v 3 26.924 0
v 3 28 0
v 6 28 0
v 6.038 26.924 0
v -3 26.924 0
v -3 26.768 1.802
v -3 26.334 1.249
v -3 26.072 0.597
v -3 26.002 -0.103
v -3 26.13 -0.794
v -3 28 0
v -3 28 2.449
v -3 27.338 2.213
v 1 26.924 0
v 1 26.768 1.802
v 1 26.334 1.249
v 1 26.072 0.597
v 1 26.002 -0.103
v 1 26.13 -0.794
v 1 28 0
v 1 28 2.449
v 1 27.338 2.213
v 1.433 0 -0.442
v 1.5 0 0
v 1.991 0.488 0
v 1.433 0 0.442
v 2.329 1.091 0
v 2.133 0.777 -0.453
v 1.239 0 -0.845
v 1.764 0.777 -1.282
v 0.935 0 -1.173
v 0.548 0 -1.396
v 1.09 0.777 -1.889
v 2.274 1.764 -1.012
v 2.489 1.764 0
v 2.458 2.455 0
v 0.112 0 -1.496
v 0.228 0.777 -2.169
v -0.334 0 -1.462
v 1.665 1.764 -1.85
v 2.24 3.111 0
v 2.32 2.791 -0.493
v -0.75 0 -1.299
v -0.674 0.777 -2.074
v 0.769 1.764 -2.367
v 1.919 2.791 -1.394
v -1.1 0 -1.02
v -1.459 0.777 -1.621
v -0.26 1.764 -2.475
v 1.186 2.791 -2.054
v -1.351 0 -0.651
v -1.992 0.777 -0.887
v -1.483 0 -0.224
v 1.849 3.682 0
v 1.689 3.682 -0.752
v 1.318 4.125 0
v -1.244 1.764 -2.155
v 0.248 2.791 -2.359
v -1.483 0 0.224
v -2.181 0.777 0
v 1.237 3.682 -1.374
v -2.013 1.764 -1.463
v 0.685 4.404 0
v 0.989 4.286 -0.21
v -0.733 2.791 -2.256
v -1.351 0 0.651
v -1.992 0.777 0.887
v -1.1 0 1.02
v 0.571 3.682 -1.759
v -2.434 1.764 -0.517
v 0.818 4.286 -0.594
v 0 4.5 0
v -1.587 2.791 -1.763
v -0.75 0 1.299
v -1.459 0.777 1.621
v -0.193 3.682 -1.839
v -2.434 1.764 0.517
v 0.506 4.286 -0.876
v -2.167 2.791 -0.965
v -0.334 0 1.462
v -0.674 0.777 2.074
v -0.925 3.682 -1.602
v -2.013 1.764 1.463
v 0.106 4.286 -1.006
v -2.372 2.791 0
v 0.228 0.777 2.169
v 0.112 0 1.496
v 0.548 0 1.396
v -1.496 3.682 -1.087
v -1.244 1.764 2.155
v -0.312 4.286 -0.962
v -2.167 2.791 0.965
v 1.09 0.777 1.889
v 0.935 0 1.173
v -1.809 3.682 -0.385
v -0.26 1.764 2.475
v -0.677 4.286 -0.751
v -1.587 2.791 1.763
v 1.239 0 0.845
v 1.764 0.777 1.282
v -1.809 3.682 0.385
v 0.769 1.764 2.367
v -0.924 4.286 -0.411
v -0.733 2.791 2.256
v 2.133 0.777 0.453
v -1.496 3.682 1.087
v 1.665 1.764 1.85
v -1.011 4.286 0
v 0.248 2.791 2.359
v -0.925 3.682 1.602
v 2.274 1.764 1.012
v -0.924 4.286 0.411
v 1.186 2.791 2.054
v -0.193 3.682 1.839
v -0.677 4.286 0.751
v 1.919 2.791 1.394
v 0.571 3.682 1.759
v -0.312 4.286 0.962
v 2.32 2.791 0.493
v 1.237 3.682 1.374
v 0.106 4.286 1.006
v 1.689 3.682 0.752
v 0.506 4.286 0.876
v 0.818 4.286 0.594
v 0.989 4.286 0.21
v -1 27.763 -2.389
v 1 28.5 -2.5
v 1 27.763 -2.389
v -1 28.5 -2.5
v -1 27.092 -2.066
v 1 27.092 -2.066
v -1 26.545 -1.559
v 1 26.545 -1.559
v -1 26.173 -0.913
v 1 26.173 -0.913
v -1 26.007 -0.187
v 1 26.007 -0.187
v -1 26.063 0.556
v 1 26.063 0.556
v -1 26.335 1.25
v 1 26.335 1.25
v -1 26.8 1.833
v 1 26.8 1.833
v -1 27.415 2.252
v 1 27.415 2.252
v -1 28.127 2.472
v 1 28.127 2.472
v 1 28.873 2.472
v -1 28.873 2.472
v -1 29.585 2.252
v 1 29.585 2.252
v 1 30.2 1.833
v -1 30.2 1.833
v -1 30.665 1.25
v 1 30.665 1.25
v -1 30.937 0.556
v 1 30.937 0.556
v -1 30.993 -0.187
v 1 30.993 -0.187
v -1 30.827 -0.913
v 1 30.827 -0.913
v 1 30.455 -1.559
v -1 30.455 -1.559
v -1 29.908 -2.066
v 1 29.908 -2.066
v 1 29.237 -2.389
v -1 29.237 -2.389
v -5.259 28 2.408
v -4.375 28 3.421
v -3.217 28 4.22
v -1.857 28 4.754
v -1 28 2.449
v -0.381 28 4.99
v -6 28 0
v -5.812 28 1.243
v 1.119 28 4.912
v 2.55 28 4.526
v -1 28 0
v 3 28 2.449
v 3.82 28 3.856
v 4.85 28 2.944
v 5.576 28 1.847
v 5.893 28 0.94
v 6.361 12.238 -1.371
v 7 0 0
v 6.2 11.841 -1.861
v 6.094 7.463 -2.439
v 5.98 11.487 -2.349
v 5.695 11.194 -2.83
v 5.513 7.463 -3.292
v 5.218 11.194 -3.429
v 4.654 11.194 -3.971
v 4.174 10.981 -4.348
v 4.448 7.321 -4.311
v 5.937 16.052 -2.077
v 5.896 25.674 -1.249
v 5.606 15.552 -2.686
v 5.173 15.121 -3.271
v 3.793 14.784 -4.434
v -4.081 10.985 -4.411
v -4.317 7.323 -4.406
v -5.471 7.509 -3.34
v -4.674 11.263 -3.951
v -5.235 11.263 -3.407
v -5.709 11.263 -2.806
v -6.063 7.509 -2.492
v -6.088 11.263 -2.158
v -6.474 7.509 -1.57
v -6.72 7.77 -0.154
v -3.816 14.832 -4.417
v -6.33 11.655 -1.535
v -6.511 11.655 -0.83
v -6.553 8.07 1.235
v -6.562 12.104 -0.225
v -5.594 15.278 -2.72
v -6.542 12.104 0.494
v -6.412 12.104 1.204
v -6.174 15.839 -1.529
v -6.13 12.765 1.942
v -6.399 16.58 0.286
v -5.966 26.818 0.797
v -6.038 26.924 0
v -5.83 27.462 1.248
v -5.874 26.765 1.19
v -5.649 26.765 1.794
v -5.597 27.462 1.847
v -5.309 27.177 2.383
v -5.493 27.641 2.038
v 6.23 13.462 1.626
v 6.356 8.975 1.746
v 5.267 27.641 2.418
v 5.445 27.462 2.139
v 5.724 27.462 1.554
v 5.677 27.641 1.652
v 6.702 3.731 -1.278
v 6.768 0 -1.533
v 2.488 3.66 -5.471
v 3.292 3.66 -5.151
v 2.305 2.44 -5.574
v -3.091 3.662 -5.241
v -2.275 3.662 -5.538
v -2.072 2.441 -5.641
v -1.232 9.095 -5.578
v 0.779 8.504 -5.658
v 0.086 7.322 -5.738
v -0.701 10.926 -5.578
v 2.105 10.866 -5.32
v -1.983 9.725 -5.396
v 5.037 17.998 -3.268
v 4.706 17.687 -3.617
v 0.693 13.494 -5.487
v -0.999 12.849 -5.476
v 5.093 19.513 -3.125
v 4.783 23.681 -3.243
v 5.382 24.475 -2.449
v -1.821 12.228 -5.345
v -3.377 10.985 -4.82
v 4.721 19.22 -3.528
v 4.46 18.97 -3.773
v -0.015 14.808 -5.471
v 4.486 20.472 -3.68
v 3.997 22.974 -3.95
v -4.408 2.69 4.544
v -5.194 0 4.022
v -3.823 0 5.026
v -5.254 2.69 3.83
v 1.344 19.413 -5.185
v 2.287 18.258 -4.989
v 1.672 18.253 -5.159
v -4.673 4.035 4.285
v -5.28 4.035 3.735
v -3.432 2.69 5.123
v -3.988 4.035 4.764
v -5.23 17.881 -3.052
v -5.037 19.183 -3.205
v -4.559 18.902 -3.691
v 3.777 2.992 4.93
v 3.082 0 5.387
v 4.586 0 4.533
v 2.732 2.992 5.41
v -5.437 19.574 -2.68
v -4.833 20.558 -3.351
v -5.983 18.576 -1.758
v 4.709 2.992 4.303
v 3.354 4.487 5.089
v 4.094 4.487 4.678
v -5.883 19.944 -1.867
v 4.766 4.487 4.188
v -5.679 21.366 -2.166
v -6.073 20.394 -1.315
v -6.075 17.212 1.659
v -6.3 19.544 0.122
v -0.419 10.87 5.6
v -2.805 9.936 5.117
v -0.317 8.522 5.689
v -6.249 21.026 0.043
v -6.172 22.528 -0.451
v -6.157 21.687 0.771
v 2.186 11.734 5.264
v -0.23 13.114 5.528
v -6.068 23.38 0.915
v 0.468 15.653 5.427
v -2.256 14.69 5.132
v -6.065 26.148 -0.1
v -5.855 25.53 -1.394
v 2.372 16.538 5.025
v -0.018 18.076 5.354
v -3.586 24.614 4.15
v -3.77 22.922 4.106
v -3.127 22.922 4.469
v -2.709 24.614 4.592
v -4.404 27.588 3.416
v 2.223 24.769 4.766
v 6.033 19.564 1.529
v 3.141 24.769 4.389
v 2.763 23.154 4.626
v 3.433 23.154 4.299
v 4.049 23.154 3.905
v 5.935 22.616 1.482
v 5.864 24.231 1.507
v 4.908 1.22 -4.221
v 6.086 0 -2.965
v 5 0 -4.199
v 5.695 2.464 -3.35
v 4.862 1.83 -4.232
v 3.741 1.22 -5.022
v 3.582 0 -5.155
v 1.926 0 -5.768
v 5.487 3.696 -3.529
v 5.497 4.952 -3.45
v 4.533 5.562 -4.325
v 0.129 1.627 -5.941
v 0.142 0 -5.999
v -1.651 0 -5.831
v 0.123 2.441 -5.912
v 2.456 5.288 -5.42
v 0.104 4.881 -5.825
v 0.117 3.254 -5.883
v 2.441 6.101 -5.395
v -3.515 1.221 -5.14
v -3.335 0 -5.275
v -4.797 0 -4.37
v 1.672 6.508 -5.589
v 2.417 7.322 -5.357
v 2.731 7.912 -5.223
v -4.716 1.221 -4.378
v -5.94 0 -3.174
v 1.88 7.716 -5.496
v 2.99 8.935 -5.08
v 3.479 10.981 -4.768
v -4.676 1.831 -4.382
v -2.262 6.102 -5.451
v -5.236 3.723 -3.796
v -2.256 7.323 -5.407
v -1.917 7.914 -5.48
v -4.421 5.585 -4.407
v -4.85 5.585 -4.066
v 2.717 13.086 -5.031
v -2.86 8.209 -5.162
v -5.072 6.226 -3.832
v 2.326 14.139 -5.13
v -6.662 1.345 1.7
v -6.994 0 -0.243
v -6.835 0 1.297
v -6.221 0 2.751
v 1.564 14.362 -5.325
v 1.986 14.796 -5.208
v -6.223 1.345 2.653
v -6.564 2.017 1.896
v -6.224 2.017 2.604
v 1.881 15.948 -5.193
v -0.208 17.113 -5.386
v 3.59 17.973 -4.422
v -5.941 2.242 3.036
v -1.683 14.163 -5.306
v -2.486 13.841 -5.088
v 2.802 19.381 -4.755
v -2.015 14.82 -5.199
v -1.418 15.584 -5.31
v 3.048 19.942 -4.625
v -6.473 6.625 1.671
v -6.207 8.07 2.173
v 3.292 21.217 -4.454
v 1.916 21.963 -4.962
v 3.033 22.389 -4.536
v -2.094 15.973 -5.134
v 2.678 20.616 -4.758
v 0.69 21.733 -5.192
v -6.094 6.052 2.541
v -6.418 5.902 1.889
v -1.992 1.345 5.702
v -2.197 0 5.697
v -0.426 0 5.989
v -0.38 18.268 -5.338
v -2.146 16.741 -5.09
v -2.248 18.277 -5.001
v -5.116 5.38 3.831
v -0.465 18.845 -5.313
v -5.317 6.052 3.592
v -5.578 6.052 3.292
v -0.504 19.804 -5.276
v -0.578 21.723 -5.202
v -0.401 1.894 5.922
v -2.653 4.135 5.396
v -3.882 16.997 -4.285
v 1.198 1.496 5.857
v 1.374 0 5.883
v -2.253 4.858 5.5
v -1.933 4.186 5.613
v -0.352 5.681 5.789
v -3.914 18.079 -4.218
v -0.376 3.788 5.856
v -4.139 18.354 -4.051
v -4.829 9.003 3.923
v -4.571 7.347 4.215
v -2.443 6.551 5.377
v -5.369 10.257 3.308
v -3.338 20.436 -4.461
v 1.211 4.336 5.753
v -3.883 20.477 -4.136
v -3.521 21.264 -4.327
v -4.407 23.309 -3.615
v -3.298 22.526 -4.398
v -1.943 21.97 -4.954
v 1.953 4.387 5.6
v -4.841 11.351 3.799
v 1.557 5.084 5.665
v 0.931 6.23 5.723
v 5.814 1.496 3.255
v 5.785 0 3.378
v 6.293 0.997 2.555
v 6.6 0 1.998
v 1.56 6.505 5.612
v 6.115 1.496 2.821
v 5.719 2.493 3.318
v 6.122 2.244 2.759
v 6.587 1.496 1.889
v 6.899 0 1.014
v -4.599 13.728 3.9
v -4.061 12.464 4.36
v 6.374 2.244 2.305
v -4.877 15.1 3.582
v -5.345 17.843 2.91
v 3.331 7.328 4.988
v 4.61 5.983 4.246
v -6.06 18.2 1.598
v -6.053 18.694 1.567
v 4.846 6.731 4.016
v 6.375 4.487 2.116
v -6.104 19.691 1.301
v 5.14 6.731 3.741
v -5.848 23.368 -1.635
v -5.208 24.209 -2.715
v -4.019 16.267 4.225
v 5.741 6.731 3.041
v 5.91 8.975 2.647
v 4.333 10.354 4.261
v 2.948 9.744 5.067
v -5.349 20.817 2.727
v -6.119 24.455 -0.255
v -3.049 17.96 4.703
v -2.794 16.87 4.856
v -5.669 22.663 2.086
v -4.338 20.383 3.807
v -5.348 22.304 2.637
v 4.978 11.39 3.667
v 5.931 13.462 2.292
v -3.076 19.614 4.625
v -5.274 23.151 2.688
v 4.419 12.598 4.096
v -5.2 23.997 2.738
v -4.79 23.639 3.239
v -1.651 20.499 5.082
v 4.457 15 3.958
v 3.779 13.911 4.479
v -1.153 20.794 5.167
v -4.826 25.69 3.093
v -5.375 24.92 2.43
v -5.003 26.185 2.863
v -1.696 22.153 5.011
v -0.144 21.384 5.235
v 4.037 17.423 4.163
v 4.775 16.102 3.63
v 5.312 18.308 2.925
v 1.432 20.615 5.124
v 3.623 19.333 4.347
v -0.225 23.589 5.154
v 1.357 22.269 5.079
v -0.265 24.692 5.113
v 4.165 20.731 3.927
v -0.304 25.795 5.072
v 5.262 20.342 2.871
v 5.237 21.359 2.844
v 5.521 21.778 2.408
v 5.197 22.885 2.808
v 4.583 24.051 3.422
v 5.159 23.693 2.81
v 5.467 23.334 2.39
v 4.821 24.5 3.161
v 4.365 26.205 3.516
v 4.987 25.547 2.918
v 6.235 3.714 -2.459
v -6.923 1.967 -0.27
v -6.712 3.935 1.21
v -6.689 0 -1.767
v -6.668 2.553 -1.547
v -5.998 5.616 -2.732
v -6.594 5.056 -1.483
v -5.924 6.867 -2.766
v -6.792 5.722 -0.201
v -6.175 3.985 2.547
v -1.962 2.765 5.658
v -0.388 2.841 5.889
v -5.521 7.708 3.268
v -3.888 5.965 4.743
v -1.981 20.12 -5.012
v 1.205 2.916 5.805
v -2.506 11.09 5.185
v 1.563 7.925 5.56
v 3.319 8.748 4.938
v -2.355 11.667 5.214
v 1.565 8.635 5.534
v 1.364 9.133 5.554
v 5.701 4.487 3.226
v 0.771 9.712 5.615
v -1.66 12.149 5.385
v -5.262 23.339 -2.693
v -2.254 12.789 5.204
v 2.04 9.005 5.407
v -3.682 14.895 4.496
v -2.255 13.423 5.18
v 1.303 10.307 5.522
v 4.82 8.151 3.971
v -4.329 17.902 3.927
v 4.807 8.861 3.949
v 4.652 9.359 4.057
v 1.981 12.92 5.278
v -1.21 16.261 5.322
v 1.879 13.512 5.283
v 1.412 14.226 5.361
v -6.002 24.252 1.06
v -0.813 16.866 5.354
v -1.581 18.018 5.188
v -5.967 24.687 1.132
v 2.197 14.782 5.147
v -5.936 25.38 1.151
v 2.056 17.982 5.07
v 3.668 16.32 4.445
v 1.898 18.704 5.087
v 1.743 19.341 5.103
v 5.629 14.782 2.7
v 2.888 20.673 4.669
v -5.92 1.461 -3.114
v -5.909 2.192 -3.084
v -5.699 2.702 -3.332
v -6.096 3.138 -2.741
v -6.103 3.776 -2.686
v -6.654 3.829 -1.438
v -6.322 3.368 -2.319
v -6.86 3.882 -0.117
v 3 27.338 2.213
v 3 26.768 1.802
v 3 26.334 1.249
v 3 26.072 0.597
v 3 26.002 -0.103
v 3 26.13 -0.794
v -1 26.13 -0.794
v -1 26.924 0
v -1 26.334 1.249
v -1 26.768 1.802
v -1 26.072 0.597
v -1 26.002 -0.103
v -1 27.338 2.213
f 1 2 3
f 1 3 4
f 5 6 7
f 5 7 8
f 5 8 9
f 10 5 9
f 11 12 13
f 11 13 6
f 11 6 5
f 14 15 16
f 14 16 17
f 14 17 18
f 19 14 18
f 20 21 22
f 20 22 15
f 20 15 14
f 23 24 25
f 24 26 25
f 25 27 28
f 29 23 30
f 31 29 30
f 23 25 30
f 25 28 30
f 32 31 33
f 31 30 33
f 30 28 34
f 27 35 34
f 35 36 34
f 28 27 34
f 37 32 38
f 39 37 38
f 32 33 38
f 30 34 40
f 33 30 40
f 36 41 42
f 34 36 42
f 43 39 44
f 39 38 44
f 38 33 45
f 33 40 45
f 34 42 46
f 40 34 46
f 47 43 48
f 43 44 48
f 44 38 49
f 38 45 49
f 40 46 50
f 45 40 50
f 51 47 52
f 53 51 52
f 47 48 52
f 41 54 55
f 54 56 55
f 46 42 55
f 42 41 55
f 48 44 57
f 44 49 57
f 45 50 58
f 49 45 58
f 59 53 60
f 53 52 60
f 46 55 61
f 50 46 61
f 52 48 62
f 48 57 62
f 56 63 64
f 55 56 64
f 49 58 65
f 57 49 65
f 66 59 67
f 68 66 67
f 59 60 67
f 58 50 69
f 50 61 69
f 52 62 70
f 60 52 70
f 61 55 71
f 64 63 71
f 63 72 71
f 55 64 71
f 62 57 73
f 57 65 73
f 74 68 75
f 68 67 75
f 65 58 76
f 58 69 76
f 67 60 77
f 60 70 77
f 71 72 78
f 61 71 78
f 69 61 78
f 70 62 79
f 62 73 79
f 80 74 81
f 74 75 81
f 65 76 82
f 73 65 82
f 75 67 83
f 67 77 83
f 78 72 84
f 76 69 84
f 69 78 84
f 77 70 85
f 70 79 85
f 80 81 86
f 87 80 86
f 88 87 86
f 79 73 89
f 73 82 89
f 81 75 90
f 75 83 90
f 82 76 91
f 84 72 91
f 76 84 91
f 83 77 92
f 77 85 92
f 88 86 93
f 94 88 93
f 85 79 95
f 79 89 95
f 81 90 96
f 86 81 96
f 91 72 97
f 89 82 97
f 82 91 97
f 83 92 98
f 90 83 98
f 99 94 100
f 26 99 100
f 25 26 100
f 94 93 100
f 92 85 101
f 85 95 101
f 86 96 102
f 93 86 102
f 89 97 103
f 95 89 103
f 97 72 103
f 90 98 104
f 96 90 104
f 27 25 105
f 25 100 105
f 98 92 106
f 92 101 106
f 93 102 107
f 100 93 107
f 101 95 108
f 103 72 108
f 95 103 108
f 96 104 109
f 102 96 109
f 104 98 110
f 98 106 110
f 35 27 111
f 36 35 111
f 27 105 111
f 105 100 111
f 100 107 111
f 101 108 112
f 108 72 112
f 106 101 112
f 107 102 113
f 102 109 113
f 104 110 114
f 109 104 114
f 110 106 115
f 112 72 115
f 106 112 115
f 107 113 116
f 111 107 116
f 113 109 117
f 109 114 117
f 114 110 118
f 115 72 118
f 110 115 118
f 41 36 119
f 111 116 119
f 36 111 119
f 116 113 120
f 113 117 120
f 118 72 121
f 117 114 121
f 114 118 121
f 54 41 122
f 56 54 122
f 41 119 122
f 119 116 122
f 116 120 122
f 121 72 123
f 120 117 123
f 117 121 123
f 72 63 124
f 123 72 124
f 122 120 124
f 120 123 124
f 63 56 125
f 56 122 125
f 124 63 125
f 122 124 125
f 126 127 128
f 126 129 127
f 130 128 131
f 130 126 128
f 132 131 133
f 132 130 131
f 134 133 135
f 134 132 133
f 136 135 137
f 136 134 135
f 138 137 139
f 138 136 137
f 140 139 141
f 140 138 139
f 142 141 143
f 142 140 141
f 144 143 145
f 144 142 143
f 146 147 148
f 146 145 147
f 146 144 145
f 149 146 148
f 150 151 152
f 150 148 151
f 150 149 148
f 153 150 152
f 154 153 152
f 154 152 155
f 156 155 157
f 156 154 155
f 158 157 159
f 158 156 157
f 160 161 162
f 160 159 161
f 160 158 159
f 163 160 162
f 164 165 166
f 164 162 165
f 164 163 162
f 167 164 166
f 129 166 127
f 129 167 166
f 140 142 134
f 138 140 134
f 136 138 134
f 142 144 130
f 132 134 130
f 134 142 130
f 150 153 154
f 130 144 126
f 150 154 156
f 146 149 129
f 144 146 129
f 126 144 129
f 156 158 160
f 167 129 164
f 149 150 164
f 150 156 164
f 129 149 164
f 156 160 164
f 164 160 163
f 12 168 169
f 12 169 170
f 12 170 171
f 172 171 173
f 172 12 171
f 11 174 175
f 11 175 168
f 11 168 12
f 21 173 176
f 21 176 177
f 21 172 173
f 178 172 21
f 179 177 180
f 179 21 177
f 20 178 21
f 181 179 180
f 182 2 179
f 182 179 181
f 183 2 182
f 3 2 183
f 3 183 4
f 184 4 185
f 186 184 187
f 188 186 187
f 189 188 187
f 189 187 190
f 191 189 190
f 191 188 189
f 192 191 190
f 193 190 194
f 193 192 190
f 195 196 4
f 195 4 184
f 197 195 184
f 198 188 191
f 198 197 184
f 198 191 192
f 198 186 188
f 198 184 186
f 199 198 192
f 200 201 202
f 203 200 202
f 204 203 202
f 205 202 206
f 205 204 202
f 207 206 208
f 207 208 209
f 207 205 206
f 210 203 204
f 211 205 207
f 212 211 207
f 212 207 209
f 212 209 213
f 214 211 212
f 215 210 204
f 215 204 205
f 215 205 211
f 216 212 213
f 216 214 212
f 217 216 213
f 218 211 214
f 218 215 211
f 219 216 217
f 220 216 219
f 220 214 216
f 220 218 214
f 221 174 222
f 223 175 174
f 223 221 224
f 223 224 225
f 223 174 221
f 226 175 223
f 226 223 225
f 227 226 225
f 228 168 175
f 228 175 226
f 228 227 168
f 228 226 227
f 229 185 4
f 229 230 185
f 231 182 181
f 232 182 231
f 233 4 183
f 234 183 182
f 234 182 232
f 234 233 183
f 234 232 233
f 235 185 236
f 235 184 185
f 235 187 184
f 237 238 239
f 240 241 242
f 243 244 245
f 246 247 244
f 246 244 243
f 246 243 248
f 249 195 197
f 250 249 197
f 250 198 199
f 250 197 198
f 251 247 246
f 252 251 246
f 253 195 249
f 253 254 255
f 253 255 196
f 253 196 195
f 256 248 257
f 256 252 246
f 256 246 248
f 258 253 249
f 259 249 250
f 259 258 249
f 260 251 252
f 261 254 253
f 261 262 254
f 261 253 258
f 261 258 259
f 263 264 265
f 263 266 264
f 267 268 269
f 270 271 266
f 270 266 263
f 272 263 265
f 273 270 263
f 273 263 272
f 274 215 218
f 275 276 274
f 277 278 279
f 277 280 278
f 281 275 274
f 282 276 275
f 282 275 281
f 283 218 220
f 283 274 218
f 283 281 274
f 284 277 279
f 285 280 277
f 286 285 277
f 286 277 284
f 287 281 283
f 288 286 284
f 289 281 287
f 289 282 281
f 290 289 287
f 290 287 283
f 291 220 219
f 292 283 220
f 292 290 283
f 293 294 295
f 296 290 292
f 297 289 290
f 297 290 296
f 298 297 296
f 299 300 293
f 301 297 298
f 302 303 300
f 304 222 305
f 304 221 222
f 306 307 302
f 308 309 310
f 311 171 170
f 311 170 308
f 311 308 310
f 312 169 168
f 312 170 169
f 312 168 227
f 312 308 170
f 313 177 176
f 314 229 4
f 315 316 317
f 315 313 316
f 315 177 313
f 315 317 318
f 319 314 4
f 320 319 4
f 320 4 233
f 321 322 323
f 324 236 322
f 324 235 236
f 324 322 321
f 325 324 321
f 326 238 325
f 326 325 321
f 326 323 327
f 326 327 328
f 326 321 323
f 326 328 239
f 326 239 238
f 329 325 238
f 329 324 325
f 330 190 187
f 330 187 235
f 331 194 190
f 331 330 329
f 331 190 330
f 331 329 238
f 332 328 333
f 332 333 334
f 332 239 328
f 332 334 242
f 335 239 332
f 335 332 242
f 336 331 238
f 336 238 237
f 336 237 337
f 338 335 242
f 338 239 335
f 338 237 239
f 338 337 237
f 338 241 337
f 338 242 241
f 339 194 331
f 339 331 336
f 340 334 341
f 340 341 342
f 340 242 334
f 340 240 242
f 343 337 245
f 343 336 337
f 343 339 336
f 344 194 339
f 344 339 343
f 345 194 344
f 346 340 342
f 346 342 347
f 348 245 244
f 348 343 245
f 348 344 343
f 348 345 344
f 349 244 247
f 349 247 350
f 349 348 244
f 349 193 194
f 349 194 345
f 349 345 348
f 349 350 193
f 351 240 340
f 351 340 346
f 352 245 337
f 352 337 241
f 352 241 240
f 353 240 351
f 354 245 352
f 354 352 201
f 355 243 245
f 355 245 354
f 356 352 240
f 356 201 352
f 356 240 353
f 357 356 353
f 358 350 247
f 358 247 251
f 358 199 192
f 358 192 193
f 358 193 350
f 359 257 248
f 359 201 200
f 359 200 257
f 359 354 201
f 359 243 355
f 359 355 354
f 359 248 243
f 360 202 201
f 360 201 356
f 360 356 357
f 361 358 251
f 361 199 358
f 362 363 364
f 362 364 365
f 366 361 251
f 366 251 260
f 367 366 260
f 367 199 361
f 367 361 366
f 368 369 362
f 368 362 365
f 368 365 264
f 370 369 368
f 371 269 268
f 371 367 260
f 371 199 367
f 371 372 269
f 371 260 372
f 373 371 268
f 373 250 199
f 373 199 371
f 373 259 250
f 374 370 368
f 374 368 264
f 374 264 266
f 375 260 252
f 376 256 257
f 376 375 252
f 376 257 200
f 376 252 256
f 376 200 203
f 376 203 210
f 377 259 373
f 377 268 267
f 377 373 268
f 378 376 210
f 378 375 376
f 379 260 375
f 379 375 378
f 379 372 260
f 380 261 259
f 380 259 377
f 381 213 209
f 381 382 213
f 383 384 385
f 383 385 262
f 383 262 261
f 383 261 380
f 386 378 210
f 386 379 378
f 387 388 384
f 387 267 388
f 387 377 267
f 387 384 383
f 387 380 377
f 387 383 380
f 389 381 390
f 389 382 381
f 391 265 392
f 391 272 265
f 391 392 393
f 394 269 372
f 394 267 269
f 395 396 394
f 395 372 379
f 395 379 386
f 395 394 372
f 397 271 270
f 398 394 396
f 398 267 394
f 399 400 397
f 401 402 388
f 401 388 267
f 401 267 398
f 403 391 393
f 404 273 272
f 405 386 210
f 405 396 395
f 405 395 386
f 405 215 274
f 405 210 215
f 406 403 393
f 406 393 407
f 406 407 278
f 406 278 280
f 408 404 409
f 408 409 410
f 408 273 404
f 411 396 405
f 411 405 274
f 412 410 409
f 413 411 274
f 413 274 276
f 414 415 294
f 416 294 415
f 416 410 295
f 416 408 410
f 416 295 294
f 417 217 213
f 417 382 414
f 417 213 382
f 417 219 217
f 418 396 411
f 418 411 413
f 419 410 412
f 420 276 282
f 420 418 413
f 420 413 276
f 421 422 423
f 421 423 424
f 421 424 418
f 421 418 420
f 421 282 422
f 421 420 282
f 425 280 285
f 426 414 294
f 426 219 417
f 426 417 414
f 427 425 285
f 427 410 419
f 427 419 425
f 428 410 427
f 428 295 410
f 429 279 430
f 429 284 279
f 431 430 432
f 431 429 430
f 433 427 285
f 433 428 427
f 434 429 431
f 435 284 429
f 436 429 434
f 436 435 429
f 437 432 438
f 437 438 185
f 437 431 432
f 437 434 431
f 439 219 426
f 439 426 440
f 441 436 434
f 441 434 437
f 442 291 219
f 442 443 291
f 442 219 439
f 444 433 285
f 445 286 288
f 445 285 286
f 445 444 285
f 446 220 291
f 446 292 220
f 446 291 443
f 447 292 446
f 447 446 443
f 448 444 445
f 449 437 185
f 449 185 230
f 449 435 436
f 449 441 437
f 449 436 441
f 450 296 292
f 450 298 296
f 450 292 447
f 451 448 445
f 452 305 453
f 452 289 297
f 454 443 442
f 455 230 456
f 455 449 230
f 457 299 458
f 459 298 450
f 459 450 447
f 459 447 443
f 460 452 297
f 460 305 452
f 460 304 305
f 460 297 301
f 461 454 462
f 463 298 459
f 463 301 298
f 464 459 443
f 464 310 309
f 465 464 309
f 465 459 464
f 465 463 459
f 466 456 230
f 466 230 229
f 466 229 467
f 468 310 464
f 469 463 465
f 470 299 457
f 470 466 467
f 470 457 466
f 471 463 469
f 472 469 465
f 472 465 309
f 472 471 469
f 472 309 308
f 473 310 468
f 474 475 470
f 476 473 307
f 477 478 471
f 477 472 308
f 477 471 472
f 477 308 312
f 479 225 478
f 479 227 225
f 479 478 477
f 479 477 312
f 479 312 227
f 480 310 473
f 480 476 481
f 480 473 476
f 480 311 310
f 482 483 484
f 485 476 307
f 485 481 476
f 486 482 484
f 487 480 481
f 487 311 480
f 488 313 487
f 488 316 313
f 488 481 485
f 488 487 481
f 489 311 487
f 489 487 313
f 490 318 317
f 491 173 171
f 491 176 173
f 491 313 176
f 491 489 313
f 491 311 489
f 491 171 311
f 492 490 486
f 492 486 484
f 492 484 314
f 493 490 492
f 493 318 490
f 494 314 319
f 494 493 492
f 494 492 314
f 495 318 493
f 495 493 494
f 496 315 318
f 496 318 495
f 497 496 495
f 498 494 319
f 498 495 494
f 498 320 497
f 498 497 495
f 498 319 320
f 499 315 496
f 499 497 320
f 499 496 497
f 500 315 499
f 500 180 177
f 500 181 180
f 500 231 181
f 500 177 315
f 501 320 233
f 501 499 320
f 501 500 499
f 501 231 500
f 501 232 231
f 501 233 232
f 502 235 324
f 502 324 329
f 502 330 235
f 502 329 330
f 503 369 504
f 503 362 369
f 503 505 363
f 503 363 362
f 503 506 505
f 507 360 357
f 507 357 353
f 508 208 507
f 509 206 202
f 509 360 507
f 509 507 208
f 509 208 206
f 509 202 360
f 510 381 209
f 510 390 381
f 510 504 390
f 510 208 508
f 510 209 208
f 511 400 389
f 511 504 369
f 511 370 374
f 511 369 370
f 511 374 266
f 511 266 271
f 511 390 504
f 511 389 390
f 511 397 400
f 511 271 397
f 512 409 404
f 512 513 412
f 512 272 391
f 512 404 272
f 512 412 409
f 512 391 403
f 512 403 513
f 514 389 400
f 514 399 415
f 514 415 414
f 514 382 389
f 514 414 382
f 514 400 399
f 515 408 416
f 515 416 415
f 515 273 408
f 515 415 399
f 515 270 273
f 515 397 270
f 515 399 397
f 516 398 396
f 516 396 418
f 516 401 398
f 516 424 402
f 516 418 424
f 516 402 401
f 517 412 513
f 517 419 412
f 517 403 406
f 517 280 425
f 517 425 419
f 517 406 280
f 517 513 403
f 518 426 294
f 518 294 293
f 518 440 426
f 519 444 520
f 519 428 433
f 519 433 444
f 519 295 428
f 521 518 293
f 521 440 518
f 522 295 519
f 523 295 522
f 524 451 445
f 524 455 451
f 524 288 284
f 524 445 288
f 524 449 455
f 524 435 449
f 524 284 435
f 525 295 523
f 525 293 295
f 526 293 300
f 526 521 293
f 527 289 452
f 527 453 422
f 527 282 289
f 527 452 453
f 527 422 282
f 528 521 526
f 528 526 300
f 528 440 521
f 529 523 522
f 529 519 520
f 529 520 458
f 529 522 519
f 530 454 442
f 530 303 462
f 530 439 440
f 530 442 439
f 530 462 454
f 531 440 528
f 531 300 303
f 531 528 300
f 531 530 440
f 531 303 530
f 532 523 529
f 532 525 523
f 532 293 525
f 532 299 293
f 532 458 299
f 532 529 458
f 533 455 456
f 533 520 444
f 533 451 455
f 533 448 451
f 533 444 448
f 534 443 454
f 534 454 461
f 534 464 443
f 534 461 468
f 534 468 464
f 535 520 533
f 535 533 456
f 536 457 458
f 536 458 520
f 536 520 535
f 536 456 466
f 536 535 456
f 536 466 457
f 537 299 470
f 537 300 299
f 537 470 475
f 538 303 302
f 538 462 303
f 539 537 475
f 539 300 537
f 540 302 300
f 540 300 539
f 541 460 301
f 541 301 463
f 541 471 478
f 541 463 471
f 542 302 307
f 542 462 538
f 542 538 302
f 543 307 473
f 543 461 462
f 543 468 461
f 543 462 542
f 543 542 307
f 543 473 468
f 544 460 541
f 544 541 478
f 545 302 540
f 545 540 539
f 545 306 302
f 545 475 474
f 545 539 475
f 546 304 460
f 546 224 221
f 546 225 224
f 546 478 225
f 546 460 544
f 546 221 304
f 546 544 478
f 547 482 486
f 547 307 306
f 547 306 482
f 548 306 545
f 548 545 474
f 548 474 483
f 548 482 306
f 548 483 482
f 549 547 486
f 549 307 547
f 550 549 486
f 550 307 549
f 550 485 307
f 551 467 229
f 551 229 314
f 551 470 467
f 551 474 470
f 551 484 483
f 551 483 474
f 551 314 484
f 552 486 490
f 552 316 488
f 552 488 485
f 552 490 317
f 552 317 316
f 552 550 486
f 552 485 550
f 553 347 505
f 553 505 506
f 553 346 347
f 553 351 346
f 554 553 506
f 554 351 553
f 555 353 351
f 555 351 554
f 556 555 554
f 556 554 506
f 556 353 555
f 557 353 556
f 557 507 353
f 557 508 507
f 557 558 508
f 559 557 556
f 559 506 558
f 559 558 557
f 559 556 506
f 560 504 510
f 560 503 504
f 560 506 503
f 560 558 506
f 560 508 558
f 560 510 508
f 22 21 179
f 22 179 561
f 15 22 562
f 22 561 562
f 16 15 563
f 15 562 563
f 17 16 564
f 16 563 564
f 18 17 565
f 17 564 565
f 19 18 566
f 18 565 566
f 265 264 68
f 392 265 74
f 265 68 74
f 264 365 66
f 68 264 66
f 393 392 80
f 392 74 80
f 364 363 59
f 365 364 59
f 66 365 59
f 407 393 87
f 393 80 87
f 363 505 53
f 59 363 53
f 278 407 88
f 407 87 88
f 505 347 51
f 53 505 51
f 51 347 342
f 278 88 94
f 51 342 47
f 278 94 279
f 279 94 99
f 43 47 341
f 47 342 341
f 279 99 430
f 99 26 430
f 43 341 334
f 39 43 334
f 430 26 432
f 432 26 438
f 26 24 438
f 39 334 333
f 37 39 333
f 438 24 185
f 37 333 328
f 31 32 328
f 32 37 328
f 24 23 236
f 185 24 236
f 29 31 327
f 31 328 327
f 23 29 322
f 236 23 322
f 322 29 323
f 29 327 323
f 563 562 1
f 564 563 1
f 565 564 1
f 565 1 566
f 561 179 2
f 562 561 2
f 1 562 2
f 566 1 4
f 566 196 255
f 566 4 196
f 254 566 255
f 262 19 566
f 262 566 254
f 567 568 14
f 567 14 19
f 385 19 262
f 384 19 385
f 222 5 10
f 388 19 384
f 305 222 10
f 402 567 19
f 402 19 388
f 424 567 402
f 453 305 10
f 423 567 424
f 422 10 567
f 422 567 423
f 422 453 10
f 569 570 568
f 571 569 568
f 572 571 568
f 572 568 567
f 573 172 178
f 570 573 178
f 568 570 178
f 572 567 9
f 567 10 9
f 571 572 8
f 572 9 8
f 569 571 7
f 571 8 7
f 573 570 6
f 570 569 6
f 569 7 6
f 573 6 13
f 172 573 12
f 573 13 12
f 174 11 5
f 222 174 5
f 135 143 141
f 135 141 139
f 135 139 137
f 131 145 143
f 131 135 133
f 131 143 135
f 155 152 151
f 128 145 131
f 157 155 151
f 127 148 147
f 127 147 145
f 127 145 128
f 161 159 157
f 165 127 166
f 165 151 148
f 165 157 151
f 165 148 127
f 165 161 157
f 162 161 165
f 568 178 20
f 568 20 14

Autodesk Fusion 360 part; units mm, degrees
sketch "Sketch1" plane through (0, 0, 0) normal (0, 1, 0) x (1, 0, 0)
  ellipse E0 centre (0, 0) end of major axis (7, 0) minor radius 6
  line L0 (-7, 0) -> (7, 0) construction
  line L1 (0, -6) -> (0, 6) construction
  dimension "d2" = 12
ref_plane "WorkPlane1" through (0, 28, 0) normal (0, 1, 0) x (1, 0, 0)
sketch "Sketch2" plane through (0, 28, 0) normal (0, 1, 0) x (1, 0, 0)
  ellipse E0 centre (0, 0) end of major axis (6, 0) minor radius 5
  line L0 (-6, 0) -> (6, 0) construction
  line L1 (0, -5) -> (0, 5) construction
  dimension "d3" = 10
sketch "Sketch3" plane through (0, 28, 0) normal (0, 1, 0) x (1, 0, 0)
loft "Loft1" add profiles "Sketch1", "Sketch2" section 1 section 2 makes body 1
sketch "Sketch4" plane through (0, 0, 0) normal (1, 0, 0) x (0, 0, -1)
  line L0 (0, 0) -> (0, 1)
  line L1 (0, 1) -> (7, 8)
  line L2 (7, 8) -> (7, 0)
  line L3 (7, 0) -> (0, 0)
  line L4 (0, 28) -> (0, 26.9237)
  line L5 (0, 26.9237) -> (5.6513, 21.2732)
  line L6 (5.6513, 21.2732) -> (5.6513, 28)
  line L7 (5.6513, 28) -> (0, 28)
  line L8 (0, 28) -> (0, 26.9237)
  line L9 (0, 28) -> (0, 26.9237)
  line L10 (0, 26.9237) -> (5.6513, 21.2732)
  line L11 (5.6513, 28) -> (0, 28)
  point P0 (0, 28)
extrude "Extrude1" cut sketch "Sketch4" along normal through all and the other way through all contours L4 L5 L6 L7 L8 L9 L10 L11 bodies 1
sketch "Sketch5" plane through (0, 0, 0) normal (1, 0, 0) x (0, 0, -1)
  circle A0 centre (0, -0.5) radius 2.5
  circle A1 centre (0, 28.5) radius 2.5
  dimension "d5" = 5
  dimension "d6" = 5
extrude "Extrude2" add sketch "Sketch5" along normal mid plane 6 separate body contours A1 makes body 2
extrude "Extrude3" cut 1 faces at (-3, 28.6214, -0.8056) along direction (1, 0, 0) blind 2 on bodies 2 bodies 1 2
extrude "Extrude4" cut 1 faces at (3, 28.6214, -0.8056) along direction (-1, 0, 0) blind 2 on bodies 2 bodies 1 2
sketch "Sketch6" plane through (0, 0, 0) normal (1, 0, 0) x (0, 0, -1)
  circle A0 centre (0, 28.5) radius 1
  dimension "d16" = 2
ref_plane "WorkPlane2" through (0, 2, 0) normal (0, 1, 0) x (0, 0, 1)
sketch "Sketch7" plane through (0, 2, 0) normal (0, 1, 0) x (1, 0, 0)
  circle A0 centre (0, 0) radius 2.5
  dimension "d19" = 5
sphere "SpherePrimitive1" cut diameter 5 placed x (1, 0, 0) y (0, 0, -1) z (0, 1, 0) at (0, 2, 0) bodies 1
